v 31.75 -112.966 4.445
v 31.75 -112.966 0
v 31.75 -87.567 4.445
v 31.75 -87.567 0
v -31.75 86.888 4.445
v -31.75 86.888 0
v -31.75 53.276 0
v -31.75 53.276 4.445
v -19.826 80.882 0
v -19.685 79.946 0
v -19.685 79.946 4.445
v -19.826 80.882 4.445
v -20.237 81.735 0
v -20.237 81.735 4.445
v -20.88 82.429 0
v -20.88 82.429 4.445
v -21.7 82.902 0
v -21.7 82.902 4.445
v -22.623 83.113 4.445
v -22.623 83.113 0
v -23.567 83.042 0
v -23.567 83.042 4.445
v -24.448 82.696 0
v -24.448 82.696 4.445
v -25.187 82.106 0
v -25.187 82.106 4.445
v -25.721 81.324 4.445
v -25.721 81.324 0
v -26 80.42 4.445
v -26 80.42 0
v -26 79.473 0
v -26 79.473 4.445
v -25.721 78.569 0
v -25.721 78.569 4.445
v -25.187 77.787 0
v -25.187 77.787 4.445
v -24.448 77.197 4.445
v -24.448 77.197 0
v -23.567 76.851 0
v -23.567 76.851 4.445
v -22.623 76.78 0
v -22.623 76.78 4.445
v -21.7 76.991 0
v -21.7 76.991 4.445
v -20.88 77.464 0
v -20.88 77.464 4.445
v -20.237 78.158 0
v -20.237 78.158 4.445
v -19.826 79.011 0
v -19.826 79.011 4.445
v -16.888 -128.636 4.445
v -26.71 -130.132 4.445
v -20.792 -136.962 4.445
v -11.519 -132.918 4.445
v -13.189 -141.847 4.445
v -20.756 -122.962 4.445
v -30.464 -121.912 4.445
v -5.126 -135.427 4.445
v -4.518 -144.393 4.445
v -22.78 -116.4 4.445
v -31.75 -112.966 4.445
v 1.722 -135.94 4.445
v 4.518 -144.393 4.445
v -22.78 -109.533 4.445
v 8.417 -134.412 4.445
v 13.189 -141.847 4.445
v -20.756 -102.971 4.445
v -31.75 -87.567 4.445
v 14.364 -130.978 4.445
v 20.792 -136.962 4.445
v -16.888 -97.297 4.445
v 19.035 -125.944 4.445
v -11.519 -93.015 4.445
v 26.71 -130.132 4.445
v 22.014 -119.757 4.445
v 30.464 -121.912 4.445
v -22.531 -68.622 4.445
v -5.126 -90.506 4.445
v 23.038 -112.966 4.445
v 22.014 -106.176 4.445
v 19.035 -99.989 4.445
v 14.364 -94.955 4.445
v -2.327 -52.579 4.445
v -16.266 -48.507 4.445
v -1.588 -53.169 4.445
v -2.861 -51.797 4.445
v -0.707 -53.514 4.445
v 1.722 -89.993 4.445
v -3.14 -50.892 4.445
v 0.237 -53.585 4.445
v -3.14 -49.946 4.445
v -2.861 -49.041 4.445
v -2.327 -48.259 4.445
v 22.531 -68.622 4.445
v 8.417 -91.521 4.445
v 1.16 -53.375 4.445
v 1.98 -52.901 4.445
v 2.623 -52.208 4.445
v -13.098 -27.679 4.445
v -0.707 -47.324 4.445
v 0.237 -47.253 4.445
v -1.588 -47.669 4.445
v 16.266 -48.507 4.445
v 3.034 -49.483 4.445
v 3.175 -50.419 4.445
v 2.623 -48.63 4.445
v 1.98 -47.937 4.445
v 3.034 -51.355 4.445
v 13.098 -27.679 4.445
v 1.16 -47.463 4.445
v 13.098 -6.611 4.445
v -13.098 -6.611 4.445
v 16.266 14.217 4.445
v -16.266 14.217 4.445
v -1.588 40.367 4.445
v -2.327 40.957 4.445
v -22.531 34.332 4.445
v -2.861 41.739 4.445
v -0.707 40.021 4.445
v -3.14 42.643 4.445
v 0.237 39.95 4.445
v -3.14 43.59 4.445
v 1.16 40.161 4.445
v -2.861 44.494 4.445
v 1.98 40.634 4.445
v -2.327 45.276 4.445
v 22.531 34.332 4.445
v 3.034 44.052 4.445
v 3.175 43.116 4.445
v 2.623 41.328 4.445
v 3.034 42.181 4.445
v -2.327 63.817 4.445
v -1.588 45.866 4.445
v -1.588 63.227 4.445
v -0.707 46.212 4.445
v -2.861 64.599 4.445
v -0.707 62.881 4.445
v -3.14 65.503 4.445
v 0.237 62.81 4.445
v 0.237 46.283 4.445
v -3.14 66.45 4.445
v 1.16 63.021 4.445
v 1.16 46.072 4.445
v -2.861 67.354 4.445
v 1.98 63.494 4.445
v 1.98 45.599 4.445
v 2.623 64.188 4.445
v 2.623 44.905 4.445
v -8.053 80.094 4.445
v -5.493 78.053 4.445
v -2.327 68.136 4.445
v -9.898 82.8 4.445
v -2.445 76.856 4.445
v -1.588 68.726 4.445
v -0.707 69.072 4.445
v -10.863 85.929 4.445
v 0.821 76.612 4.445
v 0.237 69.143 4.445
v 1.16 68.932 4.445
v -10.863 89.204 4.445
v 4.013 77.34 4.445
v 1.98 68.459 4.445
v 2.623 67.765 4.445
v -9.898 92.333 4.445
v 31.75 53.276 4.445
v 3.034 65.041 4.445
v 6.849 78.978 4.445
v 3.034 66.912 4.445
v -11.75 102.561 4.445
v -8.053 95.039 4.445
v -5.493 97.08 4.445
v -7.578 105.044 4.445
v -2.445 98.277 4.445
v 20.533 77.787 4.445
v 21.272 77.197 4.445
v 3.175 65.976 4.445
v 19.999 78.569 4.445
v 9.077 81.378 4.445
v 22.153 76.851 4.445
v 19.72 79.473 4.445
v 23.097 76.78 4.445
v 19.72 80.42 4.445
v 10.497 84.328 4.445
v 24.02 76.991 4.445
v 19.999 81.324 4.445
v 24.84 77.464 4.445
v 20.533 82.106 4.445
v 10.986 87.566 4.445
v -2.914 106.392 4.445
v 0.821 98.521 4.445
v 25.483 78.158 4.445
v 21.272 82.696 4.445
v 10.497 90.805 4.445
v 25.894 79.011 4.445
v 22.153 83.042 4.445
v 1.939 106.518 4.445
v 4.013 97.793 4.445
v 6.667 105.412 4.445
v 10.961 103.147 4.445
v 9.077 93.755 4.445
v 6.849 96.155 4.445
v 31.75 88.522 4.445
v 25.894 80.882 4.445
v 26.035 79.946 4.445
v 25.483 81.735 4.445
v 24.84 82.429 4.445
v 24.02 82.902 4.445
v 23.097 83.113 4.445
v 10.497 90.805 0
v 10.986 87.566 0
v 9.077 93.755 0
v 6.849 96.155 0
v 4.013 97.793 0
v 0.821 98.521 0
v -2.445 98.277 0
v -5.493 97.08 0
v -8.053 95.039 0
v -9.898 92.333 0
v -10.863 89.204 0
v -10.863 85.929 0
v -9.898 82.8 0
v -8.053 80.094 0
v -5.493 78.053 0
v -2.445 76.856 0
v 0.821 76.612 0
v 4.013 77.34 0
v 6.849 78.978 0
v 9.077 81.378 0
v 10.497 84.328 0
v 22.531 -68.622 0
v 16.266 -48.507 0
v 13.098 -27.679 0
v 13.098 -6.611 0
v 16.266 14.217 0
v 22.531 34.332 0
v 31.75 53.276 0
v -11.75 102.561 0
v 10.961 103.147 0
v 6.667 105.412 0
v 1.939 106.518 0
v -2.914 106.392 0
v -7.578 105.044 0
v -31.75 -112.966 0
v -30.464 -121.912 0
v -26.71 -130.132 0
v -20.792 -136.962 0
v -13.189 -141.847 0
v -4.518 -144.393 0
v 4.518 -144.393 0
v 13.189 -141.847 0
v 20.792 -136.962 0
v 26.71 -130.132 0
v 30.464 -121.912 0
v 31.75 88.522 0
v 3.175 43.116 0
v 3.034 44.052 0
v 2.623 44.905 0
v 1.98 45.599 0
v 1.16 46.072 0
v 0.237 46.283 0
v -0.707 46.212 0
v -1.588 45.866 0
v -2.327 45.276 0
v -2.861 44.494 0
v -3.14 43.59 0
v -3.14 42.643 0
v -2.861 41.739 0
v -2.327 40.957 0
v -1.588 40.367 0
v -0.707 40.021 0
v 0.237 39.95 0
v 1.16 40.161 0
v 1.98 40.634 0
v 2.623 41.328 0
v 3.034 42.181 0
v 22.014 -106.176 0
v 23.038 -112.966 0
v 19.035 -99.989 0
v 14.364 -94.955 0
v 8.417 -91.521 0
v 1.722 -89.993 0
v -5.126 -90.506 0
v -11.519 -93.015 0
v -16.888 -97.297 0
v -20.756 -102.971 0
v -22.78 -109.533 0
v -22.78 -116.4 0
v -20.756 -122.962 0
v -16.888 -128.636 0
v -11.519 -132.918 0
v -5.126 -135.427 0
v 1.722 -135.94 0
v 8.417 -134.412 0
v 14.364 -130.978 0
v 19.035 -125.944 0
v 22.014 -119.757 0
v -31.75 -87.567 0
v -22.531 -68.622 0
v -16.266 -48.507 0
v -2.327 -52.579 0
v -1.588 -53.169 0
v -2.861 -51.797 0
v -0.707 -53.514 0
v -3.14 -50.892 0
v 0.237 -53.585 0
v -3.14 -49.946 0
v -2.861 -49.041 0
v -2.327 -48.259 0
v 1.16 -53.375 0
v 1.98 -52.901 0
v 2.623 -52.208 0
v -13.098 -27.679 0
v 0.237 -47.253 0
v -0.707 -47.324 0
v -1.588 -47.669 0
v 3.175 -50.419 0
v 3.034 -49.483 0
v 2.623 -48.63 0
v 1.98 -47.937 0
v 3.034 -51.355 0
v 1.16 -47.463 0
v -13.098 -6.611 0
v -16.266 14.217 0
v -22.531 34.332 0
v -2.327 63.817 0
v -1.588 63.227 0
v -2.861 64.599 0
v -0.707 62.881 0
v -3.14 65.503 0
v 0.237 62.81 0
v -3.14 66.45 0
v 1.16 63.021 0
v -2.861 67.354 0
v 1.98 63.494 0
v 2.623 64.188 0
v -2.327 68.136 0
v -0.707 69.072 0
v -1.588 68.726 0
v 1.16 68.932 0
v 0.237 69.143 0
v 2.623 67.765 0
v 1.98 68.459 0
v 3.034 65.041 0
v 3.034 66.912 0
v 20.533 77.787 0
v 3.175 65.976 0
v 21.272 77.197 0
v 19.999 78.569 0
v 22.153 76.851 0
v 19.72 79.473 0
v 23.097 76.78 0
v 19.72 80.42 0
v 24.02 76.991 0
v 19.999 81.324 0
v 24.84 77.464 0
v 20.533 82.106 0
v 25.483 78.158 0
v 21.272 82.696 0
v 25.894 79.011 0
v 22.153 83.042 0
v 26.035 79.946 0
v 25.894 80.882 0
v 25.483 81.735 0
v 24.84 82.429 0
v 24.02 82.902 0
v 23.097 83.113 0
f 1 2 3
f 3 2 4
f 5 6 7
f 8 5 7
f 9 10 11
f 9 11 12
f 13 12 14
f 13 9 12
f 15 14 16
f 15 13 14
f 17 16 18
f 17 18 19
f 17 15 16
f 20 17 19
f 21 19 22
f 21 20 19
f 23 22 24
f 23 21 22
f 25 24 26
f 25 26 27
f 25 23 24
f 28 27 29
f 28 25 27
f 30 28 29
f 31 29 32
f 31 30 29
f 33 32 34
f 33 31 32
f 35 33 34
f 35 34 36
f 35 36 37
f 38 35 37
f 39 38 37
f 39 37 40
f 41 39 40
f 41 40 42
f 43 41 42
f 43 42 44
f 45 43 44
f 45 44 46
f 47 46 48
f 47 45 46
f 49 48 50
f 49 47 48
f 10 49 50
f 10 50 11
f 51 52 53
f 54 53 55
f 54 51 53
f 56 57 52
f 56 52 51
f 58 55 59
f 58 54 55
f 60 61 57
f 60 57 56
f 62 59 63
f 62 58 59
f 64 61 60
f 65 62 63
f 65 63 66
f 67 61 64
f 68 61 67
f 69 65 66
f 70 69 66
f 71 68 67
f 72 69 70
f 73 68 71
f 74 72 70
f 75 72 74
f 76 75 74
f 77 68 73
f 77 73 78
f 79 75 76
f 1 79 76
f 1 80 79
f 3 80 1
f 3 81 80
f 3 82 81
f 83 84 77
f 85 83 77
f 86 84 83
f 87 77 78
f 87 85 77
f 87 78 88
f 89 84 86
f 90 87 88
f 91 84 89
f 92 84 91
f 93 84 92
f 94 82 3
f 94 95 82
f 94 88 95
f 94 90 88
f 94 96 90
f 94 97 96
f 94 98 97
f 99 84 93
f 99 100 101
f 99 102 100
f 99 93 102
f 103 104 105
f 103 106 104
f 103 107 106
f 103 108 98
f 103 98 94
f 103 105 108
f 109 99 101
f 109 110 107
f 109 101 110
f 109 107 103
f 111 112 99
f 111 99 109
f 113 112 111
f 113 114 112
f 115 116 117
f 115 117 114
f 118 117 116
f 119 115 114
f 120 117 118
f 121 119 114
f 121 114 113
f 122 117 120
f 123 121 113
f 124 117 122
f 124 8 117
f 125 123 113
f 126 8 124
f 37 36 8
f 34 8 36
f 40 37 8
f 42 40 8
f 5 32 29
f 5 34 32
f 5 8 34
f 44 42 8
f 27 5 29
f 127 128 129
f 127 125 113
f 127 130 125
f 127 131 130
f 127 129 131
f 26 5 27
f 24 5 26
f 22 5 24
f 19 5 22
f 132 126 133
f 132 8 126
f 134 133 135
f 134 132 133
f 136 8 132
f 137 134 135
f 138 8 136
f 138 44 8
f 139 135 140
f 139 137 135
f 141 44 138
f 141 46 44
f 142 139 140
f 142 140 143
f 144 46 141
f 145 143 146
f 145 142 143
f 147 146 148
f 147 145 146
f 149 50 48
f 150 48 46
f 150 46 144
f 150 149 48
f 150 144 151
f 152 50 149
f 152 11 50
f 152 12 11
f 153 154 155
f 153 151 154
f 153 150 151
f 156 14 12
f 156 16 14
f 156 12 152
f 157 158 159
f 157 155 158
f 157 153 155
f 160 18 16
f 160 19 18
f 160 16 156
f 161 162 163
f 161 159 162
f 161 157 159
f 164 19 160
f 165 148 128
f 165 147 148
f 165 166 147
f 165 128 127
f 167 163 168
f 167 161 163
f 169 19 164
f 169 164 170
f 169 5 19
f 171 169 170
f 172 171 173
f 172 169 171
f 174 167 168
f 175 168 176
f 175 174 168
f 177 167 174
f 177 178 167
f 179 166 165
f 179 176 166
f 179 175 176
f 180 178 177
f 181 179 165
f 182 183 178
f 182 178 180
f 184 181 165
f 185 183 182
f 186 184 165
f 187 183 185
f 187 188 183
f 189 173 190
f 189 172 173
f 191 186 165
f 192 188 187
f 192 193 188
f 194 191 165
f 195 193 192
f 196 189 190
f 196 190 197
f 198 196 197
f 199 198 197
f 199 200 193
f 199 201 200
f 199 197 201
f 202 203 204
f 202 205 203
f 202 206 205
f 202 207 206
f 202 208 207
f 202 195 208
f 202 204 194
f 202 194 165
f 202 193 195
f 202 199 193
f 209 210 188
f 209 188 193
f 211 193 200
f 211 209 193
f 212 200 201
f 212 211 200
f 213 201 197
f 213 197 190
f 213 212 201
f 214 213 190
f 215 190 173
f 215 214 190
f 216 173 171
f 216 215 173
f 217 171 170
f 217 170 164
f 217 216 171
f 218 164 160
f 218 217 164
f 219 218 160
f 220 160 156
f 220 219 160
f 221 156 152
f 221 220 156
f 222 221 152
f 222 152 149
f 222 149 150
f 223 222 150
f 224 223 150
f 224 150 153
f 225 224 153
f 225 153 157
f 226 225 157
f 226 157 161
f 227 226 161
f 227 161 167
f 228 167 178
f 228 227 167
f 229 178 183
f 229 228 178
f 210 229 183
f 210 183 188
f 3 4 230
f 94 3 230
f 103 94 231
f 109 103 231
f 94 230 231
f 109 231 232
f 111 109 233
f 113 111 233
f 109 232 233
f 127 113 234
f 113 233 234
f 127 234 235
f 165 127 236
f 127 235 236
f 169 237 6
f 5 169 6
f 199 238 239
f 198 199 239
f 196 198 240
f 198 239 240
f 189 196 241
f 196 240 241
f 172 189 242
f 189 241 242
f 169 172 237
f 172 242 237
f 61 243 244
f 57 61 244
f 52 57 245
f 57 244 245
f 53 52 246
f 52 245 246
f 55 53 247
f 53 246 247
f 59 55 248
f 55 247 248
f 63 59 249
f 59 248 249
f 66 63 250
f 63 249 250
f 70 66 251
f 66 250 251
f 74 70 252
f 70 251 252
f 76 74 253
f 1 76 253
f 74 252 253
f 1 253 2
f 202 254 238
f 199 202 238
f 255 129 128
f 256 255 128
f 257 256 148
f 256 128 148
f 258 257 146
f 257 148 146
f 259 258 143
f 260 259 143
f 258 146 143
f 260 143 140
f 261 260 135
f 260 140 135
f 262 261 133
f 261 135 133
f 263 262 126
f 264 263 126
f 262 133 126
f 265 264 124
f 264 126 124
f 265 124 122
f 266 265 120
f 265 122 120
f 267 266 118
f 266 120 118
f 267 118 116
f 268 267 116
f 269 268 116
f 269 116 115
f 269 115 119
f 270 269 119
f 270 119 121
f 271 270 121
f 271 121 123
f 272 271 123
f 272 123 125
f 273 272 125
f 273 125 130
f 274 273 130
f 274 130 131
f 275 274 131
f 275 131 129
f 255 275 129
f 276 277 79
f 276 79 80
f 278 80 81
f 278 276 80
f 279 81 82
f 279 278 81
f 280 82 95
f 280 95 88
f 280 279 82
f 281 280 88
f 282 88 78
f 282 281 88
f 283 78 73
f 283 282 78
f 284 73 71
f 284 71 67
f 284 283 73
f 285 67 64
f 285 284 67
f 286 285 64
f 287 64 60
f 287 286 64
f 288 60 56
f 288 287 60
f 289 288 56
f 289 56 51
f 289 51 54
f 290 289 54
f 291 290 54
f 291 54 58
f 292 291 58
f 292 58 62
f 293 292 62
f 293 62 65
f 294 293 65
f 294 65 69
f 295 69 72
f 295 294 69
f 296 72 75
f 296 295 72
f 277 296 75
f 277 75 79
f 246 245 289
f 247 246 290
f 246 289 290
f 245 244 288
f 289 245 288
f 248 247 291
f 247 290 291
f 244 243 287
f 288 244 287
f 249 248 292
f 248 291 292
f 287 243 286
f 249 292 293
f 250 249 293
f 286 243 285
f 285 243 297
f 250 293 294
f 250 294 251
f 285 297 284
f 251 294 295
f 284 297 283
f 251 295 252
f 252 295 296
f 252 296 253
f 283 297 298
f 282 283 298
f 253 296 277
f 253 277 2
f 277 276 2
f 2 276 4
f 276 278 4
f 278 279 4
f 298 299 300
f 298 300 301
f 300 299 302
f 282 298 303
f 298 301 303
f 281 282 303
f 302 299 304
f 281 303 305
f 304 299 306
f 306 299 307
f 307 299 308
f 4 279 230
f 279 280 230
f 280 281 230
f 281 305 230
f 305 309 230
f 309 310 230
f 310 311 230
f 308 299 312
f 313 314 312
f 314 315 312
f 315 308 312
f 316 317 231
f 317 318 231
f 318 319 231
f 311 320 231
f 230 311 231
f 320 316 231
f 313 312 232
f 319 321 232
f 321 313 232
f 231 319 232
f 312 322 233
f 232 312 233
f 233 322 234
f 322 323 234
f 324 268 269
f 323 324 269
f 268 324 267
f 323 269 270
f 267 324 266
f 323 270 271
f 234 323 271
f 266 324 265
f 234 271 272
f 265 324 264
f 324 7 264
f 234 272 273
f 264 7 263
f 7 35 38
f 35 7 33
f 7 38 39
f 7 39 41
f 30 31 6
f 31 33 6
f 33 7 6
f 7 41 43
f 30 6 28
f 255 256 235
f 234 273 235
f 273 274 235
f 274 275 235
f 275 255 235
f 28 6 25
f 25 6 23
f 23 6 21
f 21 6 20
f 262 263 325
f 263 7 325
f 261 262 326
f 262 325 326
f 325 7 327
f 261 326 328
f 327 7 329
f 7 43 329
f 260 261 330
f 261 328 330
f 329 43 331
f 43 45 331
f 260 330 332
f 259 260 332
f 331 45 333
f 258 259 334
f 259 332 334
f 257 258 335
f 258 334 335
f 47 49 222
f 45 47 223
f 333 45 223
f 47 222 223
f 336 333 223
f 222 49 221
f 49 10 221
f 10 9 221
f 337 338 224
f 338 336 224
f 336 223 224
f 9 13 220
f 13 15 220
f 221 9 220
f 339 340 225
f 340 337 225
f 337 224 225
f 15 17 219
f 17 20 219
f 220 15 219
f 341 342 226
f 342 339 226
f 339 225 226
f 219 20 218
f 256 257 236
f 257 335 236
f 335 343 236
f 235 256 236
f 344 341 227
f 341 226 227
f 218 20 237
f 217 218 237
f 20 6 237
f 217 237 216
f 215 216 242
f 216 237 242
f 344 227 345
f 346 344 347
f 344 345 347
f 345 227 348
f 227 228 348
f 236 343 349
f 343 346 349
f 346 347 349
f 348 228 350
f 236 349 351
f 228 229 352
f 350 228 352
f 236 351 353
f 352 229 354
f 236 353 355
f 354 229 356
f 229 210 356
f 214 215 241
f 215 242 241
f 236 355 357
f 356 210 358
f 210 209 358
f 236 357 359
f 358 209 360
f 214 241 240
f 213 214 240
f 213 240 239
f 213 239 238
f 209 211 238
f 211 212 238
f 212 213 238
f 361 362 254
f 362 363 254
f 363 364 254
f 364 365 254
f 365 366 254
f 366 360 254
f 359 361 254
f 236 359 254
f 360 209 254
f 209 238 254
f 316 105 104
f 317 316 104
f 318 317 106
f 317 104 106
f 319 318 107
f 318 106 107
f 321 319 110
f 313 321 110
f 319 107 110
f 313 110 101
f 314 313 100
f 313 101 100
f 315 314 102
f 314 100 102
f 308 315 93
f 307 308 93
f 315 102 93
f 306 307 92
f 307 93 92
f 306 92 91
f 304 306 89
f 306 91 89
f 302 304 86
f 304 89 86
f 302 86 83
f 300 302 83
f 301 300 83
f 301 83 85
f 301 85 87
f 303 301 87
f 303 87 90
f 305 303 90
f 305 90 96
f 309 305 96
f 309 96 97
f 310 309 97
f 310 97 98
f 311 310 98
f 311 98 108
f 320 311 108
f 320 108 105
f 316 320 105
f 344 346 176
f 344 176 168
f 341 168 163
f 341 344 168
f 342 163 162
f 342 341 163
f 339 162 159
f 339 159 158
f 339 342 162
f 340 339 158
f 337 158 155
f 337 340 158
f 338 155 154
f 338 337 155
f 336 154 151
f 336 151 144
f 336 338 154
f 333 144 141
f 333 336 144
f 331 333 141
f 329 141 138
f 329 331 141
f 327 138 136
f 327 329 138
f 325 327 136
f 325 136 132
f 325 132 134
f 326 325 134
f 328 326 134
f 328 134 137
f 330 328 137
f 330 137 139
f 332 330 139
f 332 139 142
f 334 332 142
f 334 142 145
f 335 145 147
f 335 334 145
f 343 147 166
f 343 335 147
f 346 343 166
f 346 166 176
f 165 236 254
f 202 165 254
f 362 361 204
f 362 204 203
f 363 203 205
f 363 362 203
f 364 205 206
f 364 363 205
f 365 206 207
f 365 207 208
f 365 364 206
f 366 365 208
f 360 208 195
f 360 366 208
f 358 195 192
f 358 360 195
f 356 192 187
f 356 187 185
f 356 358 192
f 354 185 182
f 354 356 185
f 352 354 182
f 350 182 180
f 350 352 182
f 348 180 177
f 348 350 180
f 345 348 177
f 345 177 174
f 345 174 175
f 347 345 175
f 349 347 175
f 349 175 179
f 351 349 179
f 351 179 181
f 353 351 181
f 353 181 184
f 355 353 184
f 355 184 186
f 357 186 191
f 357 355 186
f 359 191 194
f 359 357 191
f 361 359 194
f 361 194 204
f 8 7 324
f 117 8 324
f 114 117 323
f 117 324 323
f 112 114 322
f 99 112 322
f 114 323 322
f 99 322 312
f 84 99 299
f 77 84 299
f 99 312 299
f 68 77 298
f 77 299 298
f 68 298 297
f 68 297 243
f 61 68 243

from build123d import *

# Parameters (mm, degrees)
SKETCH2_R           = 23.0378
SKETCH2_R_2         = 3.175
SKETCH2_R_3         = 10.9855
BOSS_EXTRUDE1_DEPTH = 4.445
SKETCH4_R           = 3.175
CUT_EXTRUDE2_DEPTH  = 149.225118982
CUT_EXTRUDE3_DEPTH  = 149.225118982


with BuildPart() as part:
    # Sketch2 → Boss-Extrude1 (new body)
    with BuildSketch(Plane.XY):
        with BuildLine():
            Line((31.75, 112.9665), (-31.75, 112.9665))
            Line((-31.75, 112.9665), (-31.75, 53.2765))
            ThreePointArc((-31.75, 53.2765), (-12.7, -17.145), (-31.75, -87.5665))
            Line((-31.75, -87.5665), (-31.75, -112.9665))
            ThreePointArc((-31.75, -112.9665), (0, -144.7165), (31.75, -112.9665))
            Line((31.75, -112.9665), (31.75, -87.5665))
            ThreePointArc((31.75, -87.5665), (12.7, -17.145), (31.75, 53.2765))
            Line((31.75, 53.2765), (31.75, 112.9665))
        make_face()
        with Locations((0, -112.9665)):
            Circle(SKETCH2_R, mode=Mode.SUBTRACT)
        with Locations((-22.86, 79.9465)):
            Circle(SKETCH2_R_2, mode=Mode.SUBTRACT)
        with Locations((0, 65.9765)):
            Circle(SKETCH2_R_2, mode=Mode.SUBTRACT)
        with Locations((0, 87.5665)):
            Circle(SKETCH2_R_3, mode=Mode.SUBTRACT)
        with Locations((22.86, 79.9465)):
            Circle(SKETCH2_R_2, mode=Mode.SUBTRACT)
    extrude(amount=BOSS_EXTRUDE1_DEPTH)

    # Sketch4 → Cut-Extrude2 (cut, through all)
    with BuildSketch(Plane.XY.offset(4.445)):
        with Locations((0, 43.1165)):
            Circle(SKETCH4_R)
        with Locations((0, -50.419)):
            Circle(SKETCH4_R)
    extrude(amount=-CUT_EXTRUDE2_DEPTH, mode=Mode.SUBTRACT)

    # Sketch6 → Cut-Extrude3 (cut, through all)
    with BuildSketch(Plane(origin=(0, 0, 0), x_dir=(-1, 0, 0), z_dir=(0, 0, -1))):
        with BuildLine():
            Line((-31.75, 112.9665), (-31.75, 88.521600063))
            Line((-31.75, 88.521600063), (-10.961308866, 103.147007307))
            ThreePointArc((-10.961308866, 103.147007307), (0.491450562, 106.610159741), (11.750340751, 102.560898695))
            Line((11.750340751, 102.560898695), (31.75, 86.888192115))
            Line((31.75, 86.888192115), (31.75, 112.9665))
            Line((31.75, 112.9665), (-31.75, 112.9665))
        make_face()
    extrude(amount=-CUT_EXTRUDE3_DEPTH, mode=Mode.SUBTRACT)


solid = part.part
